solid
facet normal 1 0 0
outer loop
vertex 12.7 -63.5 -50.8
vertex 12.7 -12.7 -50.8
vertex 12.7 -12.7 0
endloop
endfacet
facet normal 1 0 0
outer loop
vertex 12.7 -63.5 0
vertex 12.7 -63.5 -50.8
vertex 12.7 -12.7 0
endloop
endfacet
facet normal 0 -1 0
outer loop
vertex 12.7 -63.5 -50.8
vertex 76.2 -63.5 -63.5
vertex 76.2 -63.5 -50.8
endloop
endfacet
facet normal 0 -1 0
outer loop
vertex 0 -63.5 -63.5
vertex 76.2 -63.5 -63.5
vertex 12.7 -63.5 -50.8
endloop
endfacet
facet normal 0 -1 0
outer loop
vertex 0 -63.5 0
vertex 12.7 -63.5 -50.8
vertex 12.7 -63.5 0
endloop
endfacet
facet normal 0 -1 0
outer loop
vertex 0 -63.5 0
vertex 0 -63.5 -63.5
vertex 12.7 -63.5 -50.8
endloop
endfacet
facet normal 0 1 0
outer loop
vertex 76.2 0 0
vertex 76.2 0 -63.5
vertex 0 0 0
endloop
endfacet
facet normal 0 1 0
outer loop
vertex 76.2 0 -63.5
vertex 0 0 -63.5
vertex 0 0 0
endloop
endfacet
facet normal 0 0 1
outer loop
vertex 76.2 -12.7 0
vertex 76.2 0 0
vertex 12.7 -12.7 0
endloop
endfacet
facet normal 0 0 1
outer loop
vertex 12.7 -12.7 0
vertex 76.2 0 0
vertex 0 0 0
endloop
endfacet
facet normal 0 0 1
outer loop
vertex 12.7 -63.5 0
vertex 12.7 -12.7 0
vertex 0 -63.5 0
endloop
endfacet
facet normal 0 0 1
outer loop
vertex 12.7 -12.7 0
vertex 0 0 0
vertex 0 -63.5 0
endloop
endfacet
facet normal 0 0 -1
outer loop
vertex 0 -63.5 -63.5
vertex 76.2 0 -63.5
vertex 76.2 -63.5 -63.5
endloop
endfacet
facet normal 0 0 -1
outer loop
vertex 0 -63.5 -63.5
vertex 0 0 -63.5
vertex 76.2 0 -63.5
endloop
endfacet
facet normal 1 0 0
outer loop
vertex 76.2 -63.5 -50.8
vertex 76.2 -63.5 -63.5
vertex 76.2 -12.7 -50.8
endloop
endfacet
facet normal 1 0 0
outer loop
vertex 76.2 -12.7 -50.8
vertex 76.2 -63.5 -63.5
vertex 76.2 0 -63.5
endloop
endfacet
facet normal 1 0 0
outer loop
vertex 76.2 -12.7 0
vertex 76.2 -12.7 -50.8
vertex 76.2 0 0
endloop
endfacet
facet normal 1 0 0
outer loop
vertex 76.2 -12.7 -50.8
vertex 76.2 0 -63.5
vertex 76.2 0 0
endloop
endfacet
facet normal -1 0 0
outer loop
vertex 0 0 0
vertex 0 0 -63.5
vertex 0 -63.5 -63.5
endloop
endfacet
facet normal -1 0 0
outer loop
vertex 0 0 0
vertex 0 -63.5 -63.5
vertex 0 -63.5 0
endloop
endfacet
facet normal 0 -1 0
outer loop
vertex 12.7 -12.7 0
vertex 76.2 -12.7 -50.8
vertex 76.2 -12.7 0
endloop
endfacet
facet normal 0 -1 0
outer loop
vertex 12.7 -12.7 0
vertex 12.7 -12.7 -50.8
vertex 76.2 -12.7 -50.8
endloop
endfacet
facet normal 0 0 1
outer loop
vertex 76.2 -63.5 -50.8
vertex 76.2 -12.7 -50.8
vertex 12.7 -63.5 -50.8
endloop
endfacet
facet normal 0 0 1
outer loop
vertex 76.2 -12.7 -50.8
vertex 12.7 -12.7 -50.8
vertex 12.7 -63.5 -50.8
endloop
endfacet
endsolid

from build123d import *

# Parameters (mm, degrees)
F0_W     = 12.7
F0_H     = 63.5
F1_DEPTH = 63.5
F2_DEPTH = 63.5
F3_T     = -12.7


with BuildPart() as f1:
    # F0 (on Front) → F1 (new body)
    with BuildSketch(Plane.XZ):
        with Locations((6.35, -31.75)):
            Rectangle(F0_W, F0_H)
    extrude(amount=F1_DEPTH)

    # F2 (add): a face of the model
    f2_faces = [f1.faces().sort_by_distance(p)[0] for p in [
        (12.7, -31.75, -31.75),
    ]]
    extrude(f2_faces, amount=F2_DEPTH)

    # F3
    f3_openings = [f1.faces().sort_by_distance(p)[0] for p in [
        (38.1, -63.5, -31.75),
        (38.1, -31.75, 0),
        (76.2, -31.75, -31.75),
    ]]
    offset(amount=F3_T, openings=f3_openings)


solid = f1.part
